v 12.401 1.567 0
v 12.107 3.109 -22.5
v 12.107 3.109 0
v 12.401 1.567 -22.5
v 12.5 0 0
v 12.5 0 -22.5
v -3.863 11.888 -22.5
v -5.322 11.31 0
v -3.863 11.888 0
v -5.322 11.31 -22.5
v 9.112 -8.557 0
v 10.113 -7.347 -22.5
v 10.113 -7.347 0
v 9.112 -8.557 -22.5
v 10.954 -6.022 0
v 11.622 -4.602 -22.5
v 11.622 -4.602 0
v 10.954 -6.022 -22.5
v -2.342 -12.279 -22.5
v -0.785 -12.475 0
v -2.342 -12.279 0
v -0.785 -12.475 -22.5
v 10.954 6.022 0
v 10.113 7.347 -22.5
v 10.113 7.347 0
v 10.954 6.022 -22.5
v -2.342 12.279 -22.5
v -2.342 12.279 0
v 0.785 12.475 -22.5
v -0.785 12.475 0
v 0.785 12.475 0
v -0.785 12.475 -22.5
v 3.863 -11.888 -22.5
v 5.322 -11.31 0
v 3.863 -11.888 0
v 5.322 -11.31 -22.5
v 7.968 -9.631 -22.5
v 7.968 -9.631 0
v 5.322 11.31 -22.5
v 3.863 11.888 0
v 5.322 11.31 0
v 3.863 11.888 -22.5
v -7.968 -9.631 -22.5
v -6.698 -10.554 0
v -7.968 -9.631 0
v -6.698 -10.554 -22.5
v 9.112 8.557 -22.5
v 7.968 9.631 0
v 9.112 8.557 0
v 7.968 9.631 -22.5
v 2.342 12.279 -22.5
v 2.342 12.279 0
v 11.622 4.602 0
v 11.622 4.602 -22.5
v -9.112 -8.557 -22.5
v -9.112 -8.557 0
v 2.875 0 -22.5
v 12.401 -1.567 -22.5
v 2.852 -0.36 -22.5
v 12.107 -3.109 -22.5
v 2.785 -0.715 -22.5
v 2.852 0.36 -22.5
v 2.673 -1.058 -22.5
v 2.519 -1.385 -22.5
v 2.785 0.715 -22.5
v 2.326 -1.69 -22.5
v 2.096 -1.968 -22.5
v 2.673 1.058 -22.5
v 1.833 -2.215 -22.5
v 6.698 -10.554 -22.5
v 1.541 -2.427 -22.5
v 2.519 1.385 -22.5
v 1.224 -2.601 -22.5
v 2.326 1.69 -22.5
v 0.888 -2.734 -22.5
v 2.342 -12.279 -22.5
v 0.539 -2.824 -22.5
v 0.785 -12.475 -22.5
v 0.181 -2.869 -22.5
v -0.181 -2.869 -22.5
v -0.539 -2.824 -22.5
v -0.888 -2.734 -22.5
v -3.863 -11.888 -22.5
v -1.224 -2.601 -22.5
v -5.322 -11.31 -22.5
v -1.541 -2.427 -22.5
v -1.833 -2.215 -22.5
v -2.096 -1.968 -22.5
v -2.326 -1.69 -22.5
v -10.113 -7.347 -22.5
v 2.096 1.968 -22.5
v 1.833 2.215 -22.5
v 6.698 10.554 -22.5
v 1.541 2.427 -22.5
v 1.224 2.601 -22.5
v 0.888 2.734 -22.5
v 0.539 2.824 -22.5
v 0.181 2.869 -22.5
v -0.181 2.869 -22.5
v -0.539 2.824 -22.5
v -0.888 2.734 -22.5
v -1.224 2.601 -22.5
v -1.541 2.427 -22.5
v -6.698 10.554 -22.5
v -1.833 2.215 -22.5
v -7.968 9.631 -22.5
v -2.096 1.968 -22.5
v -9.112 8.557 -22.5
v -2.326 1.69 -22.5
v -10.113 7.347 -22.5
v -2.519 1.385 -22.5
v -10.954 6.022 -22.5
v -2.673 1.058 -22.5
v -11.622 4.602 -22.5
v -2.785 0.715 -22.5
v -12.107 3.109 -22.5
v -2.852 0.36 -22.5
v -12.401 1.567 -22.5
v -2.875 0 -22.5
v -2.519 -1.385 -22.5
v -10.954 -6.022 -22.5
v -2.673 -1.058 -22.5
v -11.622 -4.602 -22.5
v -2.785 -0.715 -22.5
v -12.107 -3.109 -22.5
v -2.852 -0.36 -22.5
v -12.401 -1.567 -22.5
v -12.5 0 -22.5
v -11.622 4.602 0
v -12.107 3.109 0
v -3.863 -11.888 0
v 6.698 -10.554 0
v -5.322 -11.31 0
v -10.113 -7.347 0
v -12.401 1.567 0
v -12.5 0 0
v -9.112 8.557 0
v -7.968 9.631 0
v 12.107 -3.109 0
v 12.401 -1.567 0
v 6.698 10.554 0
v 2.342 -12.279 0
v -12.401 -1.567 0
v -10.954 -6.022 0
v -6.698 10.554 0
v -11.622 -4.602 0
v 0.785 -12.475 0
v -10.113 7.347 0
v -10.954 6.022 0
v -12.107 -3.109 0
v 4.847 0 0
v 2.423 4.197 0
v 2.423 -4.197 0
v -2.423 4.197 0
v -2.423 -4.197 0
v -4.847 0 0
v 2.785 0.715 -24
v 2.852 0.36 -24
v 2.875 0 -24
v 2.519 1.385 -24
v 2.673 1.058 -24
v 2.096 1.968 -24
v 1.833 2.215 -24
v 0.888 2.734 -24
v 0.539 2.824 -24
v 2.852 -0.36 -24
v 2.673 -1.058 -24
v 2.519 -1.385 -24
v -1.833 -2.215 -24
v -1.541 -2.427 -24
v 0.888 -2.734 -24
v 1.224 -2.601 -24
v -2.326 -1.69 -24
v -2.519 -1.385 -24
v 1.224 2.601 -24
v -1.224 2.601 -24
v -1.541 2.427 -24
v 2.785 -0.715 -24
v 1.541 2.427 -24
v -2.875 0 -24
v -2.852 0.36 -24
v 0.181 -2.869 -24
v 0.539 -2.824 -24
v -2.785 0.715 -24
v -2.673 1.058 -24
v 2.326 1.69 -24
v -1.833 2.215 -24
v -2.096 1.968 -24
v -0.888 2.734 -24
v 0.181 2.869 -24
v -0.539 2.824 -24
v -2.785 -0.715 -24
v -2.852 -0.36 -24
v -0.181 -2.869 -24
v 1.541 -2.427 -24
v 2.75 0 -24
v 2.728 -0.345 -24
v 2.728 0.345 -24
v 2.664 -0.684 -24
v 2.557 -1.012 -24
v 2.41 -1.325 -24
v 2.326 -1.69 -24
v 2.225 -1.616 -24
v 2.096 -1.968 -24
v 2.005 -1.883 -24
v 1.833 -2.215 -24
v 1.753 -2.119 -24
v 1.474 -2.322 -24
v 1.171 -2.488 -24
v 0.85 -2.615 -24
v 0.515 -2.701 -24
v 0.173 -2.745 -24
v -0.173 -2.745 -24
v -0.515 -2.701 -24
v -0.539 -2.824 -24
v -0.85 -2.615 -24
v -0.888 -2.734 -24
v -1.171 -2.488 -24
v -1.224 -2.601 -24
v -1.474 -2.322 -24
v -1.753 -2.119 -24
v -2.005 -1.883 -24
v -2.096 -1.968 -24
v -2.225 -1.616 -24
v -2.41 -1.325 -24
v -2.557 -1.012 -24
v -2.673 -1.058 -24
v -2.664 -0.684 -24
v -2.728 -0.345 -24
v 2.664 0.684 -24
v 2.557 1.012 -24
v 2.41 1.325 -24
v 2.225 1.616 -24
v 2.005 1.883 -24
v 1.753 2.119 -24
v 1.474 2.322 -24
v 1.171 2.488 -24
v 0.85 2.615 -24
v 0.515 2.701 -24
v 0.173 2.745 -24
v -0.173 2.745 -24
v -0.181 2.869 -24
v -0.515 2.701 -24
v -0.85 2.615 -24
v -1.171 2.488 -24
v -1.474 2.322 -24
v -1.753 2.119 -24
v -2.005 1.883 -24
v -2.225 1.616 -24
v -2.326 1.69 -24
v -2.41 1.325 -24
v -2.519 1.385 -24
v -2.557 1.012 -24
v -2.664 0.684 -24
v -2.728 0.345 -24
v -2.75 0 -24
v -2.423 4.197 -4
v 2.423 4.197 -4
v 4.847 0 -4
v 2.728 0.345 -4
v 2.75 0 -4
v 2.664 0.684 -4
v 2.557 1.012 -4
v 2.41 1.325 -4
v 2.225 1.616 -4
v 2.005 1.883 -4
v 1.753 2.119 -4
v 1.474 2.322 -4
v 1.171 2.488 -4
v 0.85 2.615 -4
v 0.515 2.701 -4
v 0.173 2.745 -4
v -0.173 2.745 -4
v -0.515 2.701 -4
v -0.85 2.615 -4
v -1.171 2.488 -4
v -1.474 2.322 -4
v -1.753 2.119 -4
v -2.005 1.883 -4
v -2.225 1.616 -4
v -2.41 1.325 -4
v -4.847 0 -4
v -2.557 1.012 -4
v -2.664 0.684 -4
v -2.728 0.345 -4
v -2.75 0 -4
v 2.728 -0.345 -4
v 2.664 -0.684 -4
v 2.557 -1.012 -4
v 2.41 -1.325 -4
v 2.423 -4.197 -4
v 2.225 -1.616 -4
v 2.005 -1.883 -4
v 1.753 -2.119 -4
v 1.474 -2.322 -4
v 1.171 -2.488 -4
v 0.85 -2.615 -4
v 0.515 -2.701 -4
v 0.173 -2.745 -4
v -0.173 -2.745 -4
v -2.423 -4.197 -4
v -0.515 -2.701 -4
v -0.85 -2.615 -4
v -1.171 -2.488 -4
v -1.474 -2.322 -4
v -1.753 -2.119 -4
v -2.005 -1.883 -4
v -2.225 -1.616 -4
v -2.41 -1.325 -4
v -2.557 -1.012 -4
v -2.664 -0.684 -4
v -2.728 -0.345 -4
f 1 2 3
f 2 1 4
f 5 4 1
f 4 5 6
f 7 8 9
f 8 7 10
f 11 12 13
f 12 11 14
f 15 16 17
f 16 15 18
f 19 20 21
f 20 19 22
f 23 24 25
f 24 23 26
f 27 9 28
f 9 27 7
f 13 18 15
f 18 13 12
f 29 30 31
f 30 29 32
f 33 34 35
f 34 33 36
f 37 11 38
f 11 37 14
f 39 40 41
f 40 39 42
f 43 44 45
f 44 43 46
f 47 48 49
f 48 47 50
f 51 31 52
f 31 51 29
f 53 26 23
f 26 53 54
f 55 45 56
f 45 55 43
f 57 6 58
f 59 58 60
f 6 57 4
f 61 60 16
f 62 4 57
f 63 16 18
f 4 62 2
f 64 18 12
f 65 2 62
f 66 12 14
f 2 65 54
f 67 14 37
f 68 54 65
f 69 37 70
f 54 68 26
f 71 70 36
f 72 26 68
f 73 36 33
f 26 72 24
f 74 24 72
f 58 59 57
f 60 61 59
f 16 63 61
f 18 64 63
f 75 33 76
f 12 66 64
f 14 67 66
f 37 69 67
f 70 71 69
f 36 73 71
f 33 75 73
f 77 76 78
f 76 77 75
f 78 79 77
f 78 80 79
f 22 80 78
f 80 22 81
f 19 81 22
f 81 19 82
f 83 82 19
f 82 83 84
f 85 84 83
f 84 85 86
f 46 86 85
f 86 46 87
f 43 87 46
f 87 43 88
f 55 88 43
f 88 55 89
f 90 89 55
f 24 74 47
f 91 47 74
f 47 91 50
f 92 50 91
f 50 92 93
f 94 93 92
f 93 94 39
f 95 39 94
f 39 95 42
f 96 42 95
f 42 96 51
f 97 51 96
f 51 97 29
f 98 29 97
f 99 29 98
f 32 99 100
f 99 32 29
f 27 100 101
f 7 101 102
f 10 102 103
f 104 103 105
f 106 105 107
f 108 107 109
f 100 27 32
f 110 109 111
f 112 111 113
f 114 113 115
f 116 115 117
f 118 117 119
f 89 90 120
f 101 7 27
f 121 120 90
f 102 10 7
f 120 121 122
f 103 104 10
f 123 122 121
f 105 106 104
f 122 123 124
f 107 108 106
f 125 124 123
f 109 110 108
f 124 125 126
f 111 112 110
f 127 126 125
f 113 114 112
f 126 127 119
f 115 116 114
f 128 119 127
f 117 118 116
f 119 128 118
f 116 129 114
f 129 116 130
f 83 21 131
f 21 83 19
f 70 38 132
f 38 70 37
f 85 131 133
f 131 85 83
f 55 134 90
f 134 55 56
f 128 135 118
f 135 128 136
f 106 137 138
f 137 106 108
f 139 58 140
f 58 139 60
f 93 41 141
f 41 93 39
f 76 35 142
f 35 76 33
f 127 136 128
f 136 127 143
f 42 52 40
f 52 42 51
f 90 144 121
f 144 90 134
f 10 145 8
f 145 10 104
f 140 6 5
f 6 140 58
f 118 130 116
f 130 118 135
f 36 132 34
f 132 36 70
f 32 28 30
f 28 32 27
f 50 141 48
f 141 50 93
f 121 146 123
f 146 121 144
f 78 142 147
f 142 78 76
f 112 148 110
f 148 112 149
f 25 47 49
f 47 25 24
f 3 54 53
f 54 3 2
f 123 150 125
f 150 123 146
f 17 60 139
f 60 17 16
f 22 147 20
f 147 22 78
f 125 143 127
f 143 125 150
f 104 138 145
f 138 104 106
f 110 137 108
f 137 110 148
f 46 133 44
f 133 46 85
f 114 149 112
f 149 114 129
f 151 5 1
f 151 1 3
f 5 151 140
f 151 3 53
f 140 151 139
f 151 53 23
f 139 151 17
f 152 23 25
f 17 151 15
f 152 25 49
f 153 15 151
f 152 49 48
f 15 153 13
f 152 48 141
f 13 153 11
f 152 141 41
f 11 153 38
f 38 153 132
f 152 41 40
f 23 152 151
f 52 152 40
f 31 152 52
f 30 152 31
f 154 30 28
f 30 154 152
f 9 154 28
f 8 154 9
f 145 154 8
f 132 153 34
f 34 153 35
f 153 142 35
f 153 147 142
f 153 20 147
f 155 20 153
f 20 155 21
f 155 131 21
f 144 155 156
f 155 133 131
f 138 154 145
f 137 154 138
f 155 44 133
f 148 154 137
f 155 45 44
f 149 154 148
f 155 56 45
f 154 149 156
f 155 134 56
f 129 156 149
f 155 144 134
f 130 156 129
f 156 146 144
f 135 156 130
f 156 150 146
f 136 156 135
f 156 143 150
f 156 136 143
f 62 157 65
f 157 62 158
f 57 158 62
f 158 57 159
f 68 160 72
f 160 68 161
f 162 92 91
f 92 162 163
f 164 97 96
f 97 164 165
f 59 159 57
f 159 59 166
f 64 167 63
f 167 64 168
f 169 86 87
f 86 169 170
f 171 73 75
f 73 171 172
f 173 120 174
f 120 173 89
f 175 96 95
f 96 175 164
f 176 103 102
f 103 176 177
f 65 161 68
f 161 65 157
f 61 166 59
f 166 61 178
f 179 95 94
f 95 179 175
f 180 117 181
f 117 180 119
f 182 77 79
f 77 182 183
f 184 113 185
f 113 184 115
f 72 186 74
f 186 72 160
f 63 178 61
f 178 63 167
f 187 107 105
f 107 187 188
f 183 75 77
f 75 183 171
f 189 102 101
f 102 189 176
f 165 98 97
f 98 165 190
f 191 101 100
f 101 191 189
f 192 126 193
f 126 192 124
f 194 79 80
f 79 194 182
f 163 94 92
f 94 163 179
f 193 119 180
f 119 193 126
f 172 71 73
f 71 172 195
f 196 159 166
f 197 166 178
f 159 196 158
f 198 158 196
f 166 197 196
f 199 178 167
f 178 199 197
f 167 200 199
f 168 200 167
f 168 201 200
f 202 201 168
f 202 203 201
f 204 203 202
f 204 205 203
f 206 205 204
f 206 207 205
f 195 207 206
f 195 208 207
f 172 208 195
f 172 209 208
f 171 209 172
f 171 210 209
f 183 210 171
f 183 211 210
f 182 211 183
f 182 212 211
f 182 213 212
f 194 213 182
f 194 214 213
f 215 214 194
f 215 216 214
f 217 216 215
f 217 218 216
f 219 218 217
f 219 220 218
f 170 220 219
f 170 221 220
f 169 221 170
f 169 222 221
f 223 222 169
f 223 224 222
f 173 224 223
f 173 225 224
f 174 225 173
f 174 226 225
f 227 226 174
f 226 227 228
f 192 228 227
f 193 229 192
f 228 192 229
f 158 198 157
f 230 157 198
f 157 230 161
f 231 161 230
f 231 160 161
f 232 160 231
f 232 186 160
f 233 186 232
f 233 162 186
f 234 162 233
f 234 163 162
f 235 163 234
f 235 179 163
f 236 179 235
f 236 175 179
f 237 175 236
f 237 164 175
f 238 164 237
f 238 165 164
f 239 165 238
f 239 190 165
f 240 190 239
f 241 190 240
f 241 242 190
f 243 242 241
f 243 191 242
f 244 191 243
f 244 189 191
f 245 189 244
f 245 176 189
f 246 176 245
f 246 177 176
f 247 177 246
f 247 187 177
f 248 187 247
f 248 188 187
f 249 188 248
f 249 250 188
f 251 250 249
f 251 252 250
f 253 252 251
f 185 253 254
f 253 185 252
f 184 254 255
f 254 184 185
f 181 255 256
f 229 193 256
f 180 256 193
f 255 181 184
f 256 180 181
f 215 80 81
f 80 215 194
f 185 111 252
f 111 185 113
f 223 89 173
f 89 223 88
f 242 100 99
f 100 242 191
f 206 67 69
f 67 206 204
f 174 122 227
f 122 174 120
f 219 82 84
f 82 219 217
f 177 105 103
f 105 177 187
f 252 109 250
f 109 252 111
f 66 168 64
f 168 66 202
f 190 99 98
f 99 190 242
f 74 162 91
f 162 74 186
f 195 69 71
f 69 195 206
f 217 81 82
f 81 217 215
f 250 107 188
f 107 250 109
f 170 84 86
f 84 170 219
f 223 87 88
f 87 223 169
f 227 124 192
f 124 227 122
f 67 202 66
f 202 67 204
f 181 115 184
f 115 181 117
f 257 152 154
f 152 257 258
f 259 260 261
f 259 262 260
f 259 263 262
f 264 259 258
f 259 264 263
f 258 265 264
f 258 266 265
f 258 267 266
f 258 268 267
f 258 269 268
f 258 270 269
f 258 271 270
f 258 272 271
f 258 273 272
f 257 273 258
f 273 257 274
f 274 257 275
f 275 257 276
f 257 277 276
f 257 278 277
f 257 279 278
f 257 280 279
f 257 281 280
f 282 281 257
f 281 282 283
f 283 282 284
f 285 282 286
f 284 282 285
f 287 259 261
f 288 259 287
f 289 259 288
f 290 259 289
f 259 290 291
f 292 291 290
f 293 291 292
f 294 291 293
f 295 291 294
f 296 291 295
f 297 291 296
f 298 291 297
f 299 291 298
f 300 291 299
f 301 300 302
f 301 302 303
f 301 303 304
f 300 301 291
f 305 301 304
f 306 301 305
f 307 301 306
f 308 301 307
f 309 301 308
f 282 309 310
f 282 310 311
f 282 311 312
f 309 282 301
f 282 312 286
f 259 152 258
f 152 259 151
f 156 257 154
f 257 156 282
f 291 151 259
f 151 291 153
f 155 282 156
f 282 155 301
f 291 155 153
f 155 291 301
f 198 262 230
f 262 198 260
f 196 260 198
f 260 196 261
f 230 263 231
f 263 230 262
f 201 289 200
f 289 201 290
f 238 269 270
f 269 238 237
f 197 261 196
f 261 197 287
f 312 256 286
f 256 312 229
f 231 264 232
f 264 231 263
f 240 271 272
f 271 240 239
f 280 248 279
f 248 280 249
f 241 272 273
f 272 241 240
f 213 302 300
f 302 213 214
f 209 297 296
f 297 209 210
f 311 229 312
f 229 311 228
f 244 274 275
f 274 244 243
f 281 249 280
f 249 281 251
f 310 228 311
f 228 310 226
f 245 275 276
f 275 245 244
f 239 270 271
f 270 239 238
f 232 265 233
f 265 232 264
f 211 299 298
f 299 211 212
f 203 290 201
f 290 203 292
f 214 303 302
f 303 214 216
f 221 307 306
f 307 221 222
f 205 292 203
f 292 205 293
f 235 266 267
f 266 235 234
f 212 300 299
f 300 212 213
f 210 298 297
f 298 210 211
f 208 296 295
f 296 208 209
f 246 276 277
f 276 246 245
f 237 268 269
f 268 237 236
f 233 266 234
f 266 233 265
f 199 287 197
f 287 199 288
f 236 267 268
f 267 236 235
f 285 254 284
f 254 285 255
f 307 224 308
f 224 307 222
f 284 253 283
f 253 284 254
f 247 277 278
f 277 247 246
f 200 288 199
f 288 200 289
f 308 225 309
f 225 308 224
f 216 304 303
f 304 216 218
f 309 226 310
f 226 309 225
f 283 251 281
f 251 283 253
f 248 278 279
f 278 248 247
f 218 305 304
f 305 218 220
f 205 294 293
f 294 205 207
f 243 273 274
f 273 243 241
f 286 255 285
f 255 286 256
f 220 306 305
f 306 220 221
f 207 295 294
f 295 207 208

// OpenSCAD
$fn = 50;


difference() {
	union() {
		translate(v = [0, 0, -22.5000000000]) {
			cylinder(h = 22.5000000000, r = 12.5000000000);
		}
		#translate(v = [0, 0, -24.0000000000]) {
			cylinder(h = 24, r = 2.8750000000);
		}
	}
	union() {
		translate(v = [0, 0, 0]) {
			rotate(a = [0, 0, 0]) {
				difference() {
					union() {
						translate(v = [0, 0, -4]) {
							linear_extrude(height = 4) {
								polygon(points = [[4.8468000000, 0.0000000000], [2.4234000000, 4.1974519271], [-2.4234000000, 4.1974519271], [-4.8468000000, 0.0000000000], [-2.4234000000, -4.1974519271], [2.4234000000, -4.1974519271]]);
							}
						}
					}
					union();
				}
			}
		}
		#translate(v = [0, 0, -100.0000000000]) {
			cylinder(h = 200, r = 2.7500000000);
		}
	}
}
